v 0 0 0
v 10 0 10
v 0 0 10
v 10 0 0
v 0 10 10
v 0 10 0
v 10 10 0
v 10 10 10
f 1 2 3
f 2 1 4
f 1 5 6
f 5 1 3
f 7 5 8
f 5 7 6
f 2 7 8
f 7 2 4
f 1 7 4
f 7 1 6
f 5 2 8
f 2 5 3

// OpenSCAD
//input is a list of [points, faces] 
//For each faces, increment the point references by the previous number of points 
function combine_polyhedrons(list, points=[], faces=[], point_count=0, i=0) = 
    i < len(list) ? 
        combine_polyhedrons(list, 
            concat(points, list[i][0]), 
            concat(faces, [for (face_i = [0:len(list[i][1])-1]) 
                [for (point_i = [0:len(list[i][1][face_i])-1]) 
                    list[i][1][face_i][point_i] + point_count]]), 
            point_count + len(list[i][0]), 
            i + 1) 
        : [points, faces]; 
            
//Each poly is [points, faces] 
poly1 = [[ [0,0,0],[10,0,0],[10,0,10],[0,0,10], 
           [0,10,0],[0,10,10],[10,10,10],[10,10,0] 
         ], 
         [ [0,3,2,1,0], [0,4,5,3],[5,4,7,6,5],[1,2,6,7,1], [0,1,7,4,0] ] 
        ];                 
poly2 = [[ [0,0,10],[0,10,10],[10,10,10],[10,0,10] ], 
         [ [0,1,2,3,0] ] 
        ]; 
                
new_polyhendron = combine_polyhedrons([poly1, poly2]); 
polyhedron(points=new_polyhendron[0], faces=new_polyhendron[1]);
